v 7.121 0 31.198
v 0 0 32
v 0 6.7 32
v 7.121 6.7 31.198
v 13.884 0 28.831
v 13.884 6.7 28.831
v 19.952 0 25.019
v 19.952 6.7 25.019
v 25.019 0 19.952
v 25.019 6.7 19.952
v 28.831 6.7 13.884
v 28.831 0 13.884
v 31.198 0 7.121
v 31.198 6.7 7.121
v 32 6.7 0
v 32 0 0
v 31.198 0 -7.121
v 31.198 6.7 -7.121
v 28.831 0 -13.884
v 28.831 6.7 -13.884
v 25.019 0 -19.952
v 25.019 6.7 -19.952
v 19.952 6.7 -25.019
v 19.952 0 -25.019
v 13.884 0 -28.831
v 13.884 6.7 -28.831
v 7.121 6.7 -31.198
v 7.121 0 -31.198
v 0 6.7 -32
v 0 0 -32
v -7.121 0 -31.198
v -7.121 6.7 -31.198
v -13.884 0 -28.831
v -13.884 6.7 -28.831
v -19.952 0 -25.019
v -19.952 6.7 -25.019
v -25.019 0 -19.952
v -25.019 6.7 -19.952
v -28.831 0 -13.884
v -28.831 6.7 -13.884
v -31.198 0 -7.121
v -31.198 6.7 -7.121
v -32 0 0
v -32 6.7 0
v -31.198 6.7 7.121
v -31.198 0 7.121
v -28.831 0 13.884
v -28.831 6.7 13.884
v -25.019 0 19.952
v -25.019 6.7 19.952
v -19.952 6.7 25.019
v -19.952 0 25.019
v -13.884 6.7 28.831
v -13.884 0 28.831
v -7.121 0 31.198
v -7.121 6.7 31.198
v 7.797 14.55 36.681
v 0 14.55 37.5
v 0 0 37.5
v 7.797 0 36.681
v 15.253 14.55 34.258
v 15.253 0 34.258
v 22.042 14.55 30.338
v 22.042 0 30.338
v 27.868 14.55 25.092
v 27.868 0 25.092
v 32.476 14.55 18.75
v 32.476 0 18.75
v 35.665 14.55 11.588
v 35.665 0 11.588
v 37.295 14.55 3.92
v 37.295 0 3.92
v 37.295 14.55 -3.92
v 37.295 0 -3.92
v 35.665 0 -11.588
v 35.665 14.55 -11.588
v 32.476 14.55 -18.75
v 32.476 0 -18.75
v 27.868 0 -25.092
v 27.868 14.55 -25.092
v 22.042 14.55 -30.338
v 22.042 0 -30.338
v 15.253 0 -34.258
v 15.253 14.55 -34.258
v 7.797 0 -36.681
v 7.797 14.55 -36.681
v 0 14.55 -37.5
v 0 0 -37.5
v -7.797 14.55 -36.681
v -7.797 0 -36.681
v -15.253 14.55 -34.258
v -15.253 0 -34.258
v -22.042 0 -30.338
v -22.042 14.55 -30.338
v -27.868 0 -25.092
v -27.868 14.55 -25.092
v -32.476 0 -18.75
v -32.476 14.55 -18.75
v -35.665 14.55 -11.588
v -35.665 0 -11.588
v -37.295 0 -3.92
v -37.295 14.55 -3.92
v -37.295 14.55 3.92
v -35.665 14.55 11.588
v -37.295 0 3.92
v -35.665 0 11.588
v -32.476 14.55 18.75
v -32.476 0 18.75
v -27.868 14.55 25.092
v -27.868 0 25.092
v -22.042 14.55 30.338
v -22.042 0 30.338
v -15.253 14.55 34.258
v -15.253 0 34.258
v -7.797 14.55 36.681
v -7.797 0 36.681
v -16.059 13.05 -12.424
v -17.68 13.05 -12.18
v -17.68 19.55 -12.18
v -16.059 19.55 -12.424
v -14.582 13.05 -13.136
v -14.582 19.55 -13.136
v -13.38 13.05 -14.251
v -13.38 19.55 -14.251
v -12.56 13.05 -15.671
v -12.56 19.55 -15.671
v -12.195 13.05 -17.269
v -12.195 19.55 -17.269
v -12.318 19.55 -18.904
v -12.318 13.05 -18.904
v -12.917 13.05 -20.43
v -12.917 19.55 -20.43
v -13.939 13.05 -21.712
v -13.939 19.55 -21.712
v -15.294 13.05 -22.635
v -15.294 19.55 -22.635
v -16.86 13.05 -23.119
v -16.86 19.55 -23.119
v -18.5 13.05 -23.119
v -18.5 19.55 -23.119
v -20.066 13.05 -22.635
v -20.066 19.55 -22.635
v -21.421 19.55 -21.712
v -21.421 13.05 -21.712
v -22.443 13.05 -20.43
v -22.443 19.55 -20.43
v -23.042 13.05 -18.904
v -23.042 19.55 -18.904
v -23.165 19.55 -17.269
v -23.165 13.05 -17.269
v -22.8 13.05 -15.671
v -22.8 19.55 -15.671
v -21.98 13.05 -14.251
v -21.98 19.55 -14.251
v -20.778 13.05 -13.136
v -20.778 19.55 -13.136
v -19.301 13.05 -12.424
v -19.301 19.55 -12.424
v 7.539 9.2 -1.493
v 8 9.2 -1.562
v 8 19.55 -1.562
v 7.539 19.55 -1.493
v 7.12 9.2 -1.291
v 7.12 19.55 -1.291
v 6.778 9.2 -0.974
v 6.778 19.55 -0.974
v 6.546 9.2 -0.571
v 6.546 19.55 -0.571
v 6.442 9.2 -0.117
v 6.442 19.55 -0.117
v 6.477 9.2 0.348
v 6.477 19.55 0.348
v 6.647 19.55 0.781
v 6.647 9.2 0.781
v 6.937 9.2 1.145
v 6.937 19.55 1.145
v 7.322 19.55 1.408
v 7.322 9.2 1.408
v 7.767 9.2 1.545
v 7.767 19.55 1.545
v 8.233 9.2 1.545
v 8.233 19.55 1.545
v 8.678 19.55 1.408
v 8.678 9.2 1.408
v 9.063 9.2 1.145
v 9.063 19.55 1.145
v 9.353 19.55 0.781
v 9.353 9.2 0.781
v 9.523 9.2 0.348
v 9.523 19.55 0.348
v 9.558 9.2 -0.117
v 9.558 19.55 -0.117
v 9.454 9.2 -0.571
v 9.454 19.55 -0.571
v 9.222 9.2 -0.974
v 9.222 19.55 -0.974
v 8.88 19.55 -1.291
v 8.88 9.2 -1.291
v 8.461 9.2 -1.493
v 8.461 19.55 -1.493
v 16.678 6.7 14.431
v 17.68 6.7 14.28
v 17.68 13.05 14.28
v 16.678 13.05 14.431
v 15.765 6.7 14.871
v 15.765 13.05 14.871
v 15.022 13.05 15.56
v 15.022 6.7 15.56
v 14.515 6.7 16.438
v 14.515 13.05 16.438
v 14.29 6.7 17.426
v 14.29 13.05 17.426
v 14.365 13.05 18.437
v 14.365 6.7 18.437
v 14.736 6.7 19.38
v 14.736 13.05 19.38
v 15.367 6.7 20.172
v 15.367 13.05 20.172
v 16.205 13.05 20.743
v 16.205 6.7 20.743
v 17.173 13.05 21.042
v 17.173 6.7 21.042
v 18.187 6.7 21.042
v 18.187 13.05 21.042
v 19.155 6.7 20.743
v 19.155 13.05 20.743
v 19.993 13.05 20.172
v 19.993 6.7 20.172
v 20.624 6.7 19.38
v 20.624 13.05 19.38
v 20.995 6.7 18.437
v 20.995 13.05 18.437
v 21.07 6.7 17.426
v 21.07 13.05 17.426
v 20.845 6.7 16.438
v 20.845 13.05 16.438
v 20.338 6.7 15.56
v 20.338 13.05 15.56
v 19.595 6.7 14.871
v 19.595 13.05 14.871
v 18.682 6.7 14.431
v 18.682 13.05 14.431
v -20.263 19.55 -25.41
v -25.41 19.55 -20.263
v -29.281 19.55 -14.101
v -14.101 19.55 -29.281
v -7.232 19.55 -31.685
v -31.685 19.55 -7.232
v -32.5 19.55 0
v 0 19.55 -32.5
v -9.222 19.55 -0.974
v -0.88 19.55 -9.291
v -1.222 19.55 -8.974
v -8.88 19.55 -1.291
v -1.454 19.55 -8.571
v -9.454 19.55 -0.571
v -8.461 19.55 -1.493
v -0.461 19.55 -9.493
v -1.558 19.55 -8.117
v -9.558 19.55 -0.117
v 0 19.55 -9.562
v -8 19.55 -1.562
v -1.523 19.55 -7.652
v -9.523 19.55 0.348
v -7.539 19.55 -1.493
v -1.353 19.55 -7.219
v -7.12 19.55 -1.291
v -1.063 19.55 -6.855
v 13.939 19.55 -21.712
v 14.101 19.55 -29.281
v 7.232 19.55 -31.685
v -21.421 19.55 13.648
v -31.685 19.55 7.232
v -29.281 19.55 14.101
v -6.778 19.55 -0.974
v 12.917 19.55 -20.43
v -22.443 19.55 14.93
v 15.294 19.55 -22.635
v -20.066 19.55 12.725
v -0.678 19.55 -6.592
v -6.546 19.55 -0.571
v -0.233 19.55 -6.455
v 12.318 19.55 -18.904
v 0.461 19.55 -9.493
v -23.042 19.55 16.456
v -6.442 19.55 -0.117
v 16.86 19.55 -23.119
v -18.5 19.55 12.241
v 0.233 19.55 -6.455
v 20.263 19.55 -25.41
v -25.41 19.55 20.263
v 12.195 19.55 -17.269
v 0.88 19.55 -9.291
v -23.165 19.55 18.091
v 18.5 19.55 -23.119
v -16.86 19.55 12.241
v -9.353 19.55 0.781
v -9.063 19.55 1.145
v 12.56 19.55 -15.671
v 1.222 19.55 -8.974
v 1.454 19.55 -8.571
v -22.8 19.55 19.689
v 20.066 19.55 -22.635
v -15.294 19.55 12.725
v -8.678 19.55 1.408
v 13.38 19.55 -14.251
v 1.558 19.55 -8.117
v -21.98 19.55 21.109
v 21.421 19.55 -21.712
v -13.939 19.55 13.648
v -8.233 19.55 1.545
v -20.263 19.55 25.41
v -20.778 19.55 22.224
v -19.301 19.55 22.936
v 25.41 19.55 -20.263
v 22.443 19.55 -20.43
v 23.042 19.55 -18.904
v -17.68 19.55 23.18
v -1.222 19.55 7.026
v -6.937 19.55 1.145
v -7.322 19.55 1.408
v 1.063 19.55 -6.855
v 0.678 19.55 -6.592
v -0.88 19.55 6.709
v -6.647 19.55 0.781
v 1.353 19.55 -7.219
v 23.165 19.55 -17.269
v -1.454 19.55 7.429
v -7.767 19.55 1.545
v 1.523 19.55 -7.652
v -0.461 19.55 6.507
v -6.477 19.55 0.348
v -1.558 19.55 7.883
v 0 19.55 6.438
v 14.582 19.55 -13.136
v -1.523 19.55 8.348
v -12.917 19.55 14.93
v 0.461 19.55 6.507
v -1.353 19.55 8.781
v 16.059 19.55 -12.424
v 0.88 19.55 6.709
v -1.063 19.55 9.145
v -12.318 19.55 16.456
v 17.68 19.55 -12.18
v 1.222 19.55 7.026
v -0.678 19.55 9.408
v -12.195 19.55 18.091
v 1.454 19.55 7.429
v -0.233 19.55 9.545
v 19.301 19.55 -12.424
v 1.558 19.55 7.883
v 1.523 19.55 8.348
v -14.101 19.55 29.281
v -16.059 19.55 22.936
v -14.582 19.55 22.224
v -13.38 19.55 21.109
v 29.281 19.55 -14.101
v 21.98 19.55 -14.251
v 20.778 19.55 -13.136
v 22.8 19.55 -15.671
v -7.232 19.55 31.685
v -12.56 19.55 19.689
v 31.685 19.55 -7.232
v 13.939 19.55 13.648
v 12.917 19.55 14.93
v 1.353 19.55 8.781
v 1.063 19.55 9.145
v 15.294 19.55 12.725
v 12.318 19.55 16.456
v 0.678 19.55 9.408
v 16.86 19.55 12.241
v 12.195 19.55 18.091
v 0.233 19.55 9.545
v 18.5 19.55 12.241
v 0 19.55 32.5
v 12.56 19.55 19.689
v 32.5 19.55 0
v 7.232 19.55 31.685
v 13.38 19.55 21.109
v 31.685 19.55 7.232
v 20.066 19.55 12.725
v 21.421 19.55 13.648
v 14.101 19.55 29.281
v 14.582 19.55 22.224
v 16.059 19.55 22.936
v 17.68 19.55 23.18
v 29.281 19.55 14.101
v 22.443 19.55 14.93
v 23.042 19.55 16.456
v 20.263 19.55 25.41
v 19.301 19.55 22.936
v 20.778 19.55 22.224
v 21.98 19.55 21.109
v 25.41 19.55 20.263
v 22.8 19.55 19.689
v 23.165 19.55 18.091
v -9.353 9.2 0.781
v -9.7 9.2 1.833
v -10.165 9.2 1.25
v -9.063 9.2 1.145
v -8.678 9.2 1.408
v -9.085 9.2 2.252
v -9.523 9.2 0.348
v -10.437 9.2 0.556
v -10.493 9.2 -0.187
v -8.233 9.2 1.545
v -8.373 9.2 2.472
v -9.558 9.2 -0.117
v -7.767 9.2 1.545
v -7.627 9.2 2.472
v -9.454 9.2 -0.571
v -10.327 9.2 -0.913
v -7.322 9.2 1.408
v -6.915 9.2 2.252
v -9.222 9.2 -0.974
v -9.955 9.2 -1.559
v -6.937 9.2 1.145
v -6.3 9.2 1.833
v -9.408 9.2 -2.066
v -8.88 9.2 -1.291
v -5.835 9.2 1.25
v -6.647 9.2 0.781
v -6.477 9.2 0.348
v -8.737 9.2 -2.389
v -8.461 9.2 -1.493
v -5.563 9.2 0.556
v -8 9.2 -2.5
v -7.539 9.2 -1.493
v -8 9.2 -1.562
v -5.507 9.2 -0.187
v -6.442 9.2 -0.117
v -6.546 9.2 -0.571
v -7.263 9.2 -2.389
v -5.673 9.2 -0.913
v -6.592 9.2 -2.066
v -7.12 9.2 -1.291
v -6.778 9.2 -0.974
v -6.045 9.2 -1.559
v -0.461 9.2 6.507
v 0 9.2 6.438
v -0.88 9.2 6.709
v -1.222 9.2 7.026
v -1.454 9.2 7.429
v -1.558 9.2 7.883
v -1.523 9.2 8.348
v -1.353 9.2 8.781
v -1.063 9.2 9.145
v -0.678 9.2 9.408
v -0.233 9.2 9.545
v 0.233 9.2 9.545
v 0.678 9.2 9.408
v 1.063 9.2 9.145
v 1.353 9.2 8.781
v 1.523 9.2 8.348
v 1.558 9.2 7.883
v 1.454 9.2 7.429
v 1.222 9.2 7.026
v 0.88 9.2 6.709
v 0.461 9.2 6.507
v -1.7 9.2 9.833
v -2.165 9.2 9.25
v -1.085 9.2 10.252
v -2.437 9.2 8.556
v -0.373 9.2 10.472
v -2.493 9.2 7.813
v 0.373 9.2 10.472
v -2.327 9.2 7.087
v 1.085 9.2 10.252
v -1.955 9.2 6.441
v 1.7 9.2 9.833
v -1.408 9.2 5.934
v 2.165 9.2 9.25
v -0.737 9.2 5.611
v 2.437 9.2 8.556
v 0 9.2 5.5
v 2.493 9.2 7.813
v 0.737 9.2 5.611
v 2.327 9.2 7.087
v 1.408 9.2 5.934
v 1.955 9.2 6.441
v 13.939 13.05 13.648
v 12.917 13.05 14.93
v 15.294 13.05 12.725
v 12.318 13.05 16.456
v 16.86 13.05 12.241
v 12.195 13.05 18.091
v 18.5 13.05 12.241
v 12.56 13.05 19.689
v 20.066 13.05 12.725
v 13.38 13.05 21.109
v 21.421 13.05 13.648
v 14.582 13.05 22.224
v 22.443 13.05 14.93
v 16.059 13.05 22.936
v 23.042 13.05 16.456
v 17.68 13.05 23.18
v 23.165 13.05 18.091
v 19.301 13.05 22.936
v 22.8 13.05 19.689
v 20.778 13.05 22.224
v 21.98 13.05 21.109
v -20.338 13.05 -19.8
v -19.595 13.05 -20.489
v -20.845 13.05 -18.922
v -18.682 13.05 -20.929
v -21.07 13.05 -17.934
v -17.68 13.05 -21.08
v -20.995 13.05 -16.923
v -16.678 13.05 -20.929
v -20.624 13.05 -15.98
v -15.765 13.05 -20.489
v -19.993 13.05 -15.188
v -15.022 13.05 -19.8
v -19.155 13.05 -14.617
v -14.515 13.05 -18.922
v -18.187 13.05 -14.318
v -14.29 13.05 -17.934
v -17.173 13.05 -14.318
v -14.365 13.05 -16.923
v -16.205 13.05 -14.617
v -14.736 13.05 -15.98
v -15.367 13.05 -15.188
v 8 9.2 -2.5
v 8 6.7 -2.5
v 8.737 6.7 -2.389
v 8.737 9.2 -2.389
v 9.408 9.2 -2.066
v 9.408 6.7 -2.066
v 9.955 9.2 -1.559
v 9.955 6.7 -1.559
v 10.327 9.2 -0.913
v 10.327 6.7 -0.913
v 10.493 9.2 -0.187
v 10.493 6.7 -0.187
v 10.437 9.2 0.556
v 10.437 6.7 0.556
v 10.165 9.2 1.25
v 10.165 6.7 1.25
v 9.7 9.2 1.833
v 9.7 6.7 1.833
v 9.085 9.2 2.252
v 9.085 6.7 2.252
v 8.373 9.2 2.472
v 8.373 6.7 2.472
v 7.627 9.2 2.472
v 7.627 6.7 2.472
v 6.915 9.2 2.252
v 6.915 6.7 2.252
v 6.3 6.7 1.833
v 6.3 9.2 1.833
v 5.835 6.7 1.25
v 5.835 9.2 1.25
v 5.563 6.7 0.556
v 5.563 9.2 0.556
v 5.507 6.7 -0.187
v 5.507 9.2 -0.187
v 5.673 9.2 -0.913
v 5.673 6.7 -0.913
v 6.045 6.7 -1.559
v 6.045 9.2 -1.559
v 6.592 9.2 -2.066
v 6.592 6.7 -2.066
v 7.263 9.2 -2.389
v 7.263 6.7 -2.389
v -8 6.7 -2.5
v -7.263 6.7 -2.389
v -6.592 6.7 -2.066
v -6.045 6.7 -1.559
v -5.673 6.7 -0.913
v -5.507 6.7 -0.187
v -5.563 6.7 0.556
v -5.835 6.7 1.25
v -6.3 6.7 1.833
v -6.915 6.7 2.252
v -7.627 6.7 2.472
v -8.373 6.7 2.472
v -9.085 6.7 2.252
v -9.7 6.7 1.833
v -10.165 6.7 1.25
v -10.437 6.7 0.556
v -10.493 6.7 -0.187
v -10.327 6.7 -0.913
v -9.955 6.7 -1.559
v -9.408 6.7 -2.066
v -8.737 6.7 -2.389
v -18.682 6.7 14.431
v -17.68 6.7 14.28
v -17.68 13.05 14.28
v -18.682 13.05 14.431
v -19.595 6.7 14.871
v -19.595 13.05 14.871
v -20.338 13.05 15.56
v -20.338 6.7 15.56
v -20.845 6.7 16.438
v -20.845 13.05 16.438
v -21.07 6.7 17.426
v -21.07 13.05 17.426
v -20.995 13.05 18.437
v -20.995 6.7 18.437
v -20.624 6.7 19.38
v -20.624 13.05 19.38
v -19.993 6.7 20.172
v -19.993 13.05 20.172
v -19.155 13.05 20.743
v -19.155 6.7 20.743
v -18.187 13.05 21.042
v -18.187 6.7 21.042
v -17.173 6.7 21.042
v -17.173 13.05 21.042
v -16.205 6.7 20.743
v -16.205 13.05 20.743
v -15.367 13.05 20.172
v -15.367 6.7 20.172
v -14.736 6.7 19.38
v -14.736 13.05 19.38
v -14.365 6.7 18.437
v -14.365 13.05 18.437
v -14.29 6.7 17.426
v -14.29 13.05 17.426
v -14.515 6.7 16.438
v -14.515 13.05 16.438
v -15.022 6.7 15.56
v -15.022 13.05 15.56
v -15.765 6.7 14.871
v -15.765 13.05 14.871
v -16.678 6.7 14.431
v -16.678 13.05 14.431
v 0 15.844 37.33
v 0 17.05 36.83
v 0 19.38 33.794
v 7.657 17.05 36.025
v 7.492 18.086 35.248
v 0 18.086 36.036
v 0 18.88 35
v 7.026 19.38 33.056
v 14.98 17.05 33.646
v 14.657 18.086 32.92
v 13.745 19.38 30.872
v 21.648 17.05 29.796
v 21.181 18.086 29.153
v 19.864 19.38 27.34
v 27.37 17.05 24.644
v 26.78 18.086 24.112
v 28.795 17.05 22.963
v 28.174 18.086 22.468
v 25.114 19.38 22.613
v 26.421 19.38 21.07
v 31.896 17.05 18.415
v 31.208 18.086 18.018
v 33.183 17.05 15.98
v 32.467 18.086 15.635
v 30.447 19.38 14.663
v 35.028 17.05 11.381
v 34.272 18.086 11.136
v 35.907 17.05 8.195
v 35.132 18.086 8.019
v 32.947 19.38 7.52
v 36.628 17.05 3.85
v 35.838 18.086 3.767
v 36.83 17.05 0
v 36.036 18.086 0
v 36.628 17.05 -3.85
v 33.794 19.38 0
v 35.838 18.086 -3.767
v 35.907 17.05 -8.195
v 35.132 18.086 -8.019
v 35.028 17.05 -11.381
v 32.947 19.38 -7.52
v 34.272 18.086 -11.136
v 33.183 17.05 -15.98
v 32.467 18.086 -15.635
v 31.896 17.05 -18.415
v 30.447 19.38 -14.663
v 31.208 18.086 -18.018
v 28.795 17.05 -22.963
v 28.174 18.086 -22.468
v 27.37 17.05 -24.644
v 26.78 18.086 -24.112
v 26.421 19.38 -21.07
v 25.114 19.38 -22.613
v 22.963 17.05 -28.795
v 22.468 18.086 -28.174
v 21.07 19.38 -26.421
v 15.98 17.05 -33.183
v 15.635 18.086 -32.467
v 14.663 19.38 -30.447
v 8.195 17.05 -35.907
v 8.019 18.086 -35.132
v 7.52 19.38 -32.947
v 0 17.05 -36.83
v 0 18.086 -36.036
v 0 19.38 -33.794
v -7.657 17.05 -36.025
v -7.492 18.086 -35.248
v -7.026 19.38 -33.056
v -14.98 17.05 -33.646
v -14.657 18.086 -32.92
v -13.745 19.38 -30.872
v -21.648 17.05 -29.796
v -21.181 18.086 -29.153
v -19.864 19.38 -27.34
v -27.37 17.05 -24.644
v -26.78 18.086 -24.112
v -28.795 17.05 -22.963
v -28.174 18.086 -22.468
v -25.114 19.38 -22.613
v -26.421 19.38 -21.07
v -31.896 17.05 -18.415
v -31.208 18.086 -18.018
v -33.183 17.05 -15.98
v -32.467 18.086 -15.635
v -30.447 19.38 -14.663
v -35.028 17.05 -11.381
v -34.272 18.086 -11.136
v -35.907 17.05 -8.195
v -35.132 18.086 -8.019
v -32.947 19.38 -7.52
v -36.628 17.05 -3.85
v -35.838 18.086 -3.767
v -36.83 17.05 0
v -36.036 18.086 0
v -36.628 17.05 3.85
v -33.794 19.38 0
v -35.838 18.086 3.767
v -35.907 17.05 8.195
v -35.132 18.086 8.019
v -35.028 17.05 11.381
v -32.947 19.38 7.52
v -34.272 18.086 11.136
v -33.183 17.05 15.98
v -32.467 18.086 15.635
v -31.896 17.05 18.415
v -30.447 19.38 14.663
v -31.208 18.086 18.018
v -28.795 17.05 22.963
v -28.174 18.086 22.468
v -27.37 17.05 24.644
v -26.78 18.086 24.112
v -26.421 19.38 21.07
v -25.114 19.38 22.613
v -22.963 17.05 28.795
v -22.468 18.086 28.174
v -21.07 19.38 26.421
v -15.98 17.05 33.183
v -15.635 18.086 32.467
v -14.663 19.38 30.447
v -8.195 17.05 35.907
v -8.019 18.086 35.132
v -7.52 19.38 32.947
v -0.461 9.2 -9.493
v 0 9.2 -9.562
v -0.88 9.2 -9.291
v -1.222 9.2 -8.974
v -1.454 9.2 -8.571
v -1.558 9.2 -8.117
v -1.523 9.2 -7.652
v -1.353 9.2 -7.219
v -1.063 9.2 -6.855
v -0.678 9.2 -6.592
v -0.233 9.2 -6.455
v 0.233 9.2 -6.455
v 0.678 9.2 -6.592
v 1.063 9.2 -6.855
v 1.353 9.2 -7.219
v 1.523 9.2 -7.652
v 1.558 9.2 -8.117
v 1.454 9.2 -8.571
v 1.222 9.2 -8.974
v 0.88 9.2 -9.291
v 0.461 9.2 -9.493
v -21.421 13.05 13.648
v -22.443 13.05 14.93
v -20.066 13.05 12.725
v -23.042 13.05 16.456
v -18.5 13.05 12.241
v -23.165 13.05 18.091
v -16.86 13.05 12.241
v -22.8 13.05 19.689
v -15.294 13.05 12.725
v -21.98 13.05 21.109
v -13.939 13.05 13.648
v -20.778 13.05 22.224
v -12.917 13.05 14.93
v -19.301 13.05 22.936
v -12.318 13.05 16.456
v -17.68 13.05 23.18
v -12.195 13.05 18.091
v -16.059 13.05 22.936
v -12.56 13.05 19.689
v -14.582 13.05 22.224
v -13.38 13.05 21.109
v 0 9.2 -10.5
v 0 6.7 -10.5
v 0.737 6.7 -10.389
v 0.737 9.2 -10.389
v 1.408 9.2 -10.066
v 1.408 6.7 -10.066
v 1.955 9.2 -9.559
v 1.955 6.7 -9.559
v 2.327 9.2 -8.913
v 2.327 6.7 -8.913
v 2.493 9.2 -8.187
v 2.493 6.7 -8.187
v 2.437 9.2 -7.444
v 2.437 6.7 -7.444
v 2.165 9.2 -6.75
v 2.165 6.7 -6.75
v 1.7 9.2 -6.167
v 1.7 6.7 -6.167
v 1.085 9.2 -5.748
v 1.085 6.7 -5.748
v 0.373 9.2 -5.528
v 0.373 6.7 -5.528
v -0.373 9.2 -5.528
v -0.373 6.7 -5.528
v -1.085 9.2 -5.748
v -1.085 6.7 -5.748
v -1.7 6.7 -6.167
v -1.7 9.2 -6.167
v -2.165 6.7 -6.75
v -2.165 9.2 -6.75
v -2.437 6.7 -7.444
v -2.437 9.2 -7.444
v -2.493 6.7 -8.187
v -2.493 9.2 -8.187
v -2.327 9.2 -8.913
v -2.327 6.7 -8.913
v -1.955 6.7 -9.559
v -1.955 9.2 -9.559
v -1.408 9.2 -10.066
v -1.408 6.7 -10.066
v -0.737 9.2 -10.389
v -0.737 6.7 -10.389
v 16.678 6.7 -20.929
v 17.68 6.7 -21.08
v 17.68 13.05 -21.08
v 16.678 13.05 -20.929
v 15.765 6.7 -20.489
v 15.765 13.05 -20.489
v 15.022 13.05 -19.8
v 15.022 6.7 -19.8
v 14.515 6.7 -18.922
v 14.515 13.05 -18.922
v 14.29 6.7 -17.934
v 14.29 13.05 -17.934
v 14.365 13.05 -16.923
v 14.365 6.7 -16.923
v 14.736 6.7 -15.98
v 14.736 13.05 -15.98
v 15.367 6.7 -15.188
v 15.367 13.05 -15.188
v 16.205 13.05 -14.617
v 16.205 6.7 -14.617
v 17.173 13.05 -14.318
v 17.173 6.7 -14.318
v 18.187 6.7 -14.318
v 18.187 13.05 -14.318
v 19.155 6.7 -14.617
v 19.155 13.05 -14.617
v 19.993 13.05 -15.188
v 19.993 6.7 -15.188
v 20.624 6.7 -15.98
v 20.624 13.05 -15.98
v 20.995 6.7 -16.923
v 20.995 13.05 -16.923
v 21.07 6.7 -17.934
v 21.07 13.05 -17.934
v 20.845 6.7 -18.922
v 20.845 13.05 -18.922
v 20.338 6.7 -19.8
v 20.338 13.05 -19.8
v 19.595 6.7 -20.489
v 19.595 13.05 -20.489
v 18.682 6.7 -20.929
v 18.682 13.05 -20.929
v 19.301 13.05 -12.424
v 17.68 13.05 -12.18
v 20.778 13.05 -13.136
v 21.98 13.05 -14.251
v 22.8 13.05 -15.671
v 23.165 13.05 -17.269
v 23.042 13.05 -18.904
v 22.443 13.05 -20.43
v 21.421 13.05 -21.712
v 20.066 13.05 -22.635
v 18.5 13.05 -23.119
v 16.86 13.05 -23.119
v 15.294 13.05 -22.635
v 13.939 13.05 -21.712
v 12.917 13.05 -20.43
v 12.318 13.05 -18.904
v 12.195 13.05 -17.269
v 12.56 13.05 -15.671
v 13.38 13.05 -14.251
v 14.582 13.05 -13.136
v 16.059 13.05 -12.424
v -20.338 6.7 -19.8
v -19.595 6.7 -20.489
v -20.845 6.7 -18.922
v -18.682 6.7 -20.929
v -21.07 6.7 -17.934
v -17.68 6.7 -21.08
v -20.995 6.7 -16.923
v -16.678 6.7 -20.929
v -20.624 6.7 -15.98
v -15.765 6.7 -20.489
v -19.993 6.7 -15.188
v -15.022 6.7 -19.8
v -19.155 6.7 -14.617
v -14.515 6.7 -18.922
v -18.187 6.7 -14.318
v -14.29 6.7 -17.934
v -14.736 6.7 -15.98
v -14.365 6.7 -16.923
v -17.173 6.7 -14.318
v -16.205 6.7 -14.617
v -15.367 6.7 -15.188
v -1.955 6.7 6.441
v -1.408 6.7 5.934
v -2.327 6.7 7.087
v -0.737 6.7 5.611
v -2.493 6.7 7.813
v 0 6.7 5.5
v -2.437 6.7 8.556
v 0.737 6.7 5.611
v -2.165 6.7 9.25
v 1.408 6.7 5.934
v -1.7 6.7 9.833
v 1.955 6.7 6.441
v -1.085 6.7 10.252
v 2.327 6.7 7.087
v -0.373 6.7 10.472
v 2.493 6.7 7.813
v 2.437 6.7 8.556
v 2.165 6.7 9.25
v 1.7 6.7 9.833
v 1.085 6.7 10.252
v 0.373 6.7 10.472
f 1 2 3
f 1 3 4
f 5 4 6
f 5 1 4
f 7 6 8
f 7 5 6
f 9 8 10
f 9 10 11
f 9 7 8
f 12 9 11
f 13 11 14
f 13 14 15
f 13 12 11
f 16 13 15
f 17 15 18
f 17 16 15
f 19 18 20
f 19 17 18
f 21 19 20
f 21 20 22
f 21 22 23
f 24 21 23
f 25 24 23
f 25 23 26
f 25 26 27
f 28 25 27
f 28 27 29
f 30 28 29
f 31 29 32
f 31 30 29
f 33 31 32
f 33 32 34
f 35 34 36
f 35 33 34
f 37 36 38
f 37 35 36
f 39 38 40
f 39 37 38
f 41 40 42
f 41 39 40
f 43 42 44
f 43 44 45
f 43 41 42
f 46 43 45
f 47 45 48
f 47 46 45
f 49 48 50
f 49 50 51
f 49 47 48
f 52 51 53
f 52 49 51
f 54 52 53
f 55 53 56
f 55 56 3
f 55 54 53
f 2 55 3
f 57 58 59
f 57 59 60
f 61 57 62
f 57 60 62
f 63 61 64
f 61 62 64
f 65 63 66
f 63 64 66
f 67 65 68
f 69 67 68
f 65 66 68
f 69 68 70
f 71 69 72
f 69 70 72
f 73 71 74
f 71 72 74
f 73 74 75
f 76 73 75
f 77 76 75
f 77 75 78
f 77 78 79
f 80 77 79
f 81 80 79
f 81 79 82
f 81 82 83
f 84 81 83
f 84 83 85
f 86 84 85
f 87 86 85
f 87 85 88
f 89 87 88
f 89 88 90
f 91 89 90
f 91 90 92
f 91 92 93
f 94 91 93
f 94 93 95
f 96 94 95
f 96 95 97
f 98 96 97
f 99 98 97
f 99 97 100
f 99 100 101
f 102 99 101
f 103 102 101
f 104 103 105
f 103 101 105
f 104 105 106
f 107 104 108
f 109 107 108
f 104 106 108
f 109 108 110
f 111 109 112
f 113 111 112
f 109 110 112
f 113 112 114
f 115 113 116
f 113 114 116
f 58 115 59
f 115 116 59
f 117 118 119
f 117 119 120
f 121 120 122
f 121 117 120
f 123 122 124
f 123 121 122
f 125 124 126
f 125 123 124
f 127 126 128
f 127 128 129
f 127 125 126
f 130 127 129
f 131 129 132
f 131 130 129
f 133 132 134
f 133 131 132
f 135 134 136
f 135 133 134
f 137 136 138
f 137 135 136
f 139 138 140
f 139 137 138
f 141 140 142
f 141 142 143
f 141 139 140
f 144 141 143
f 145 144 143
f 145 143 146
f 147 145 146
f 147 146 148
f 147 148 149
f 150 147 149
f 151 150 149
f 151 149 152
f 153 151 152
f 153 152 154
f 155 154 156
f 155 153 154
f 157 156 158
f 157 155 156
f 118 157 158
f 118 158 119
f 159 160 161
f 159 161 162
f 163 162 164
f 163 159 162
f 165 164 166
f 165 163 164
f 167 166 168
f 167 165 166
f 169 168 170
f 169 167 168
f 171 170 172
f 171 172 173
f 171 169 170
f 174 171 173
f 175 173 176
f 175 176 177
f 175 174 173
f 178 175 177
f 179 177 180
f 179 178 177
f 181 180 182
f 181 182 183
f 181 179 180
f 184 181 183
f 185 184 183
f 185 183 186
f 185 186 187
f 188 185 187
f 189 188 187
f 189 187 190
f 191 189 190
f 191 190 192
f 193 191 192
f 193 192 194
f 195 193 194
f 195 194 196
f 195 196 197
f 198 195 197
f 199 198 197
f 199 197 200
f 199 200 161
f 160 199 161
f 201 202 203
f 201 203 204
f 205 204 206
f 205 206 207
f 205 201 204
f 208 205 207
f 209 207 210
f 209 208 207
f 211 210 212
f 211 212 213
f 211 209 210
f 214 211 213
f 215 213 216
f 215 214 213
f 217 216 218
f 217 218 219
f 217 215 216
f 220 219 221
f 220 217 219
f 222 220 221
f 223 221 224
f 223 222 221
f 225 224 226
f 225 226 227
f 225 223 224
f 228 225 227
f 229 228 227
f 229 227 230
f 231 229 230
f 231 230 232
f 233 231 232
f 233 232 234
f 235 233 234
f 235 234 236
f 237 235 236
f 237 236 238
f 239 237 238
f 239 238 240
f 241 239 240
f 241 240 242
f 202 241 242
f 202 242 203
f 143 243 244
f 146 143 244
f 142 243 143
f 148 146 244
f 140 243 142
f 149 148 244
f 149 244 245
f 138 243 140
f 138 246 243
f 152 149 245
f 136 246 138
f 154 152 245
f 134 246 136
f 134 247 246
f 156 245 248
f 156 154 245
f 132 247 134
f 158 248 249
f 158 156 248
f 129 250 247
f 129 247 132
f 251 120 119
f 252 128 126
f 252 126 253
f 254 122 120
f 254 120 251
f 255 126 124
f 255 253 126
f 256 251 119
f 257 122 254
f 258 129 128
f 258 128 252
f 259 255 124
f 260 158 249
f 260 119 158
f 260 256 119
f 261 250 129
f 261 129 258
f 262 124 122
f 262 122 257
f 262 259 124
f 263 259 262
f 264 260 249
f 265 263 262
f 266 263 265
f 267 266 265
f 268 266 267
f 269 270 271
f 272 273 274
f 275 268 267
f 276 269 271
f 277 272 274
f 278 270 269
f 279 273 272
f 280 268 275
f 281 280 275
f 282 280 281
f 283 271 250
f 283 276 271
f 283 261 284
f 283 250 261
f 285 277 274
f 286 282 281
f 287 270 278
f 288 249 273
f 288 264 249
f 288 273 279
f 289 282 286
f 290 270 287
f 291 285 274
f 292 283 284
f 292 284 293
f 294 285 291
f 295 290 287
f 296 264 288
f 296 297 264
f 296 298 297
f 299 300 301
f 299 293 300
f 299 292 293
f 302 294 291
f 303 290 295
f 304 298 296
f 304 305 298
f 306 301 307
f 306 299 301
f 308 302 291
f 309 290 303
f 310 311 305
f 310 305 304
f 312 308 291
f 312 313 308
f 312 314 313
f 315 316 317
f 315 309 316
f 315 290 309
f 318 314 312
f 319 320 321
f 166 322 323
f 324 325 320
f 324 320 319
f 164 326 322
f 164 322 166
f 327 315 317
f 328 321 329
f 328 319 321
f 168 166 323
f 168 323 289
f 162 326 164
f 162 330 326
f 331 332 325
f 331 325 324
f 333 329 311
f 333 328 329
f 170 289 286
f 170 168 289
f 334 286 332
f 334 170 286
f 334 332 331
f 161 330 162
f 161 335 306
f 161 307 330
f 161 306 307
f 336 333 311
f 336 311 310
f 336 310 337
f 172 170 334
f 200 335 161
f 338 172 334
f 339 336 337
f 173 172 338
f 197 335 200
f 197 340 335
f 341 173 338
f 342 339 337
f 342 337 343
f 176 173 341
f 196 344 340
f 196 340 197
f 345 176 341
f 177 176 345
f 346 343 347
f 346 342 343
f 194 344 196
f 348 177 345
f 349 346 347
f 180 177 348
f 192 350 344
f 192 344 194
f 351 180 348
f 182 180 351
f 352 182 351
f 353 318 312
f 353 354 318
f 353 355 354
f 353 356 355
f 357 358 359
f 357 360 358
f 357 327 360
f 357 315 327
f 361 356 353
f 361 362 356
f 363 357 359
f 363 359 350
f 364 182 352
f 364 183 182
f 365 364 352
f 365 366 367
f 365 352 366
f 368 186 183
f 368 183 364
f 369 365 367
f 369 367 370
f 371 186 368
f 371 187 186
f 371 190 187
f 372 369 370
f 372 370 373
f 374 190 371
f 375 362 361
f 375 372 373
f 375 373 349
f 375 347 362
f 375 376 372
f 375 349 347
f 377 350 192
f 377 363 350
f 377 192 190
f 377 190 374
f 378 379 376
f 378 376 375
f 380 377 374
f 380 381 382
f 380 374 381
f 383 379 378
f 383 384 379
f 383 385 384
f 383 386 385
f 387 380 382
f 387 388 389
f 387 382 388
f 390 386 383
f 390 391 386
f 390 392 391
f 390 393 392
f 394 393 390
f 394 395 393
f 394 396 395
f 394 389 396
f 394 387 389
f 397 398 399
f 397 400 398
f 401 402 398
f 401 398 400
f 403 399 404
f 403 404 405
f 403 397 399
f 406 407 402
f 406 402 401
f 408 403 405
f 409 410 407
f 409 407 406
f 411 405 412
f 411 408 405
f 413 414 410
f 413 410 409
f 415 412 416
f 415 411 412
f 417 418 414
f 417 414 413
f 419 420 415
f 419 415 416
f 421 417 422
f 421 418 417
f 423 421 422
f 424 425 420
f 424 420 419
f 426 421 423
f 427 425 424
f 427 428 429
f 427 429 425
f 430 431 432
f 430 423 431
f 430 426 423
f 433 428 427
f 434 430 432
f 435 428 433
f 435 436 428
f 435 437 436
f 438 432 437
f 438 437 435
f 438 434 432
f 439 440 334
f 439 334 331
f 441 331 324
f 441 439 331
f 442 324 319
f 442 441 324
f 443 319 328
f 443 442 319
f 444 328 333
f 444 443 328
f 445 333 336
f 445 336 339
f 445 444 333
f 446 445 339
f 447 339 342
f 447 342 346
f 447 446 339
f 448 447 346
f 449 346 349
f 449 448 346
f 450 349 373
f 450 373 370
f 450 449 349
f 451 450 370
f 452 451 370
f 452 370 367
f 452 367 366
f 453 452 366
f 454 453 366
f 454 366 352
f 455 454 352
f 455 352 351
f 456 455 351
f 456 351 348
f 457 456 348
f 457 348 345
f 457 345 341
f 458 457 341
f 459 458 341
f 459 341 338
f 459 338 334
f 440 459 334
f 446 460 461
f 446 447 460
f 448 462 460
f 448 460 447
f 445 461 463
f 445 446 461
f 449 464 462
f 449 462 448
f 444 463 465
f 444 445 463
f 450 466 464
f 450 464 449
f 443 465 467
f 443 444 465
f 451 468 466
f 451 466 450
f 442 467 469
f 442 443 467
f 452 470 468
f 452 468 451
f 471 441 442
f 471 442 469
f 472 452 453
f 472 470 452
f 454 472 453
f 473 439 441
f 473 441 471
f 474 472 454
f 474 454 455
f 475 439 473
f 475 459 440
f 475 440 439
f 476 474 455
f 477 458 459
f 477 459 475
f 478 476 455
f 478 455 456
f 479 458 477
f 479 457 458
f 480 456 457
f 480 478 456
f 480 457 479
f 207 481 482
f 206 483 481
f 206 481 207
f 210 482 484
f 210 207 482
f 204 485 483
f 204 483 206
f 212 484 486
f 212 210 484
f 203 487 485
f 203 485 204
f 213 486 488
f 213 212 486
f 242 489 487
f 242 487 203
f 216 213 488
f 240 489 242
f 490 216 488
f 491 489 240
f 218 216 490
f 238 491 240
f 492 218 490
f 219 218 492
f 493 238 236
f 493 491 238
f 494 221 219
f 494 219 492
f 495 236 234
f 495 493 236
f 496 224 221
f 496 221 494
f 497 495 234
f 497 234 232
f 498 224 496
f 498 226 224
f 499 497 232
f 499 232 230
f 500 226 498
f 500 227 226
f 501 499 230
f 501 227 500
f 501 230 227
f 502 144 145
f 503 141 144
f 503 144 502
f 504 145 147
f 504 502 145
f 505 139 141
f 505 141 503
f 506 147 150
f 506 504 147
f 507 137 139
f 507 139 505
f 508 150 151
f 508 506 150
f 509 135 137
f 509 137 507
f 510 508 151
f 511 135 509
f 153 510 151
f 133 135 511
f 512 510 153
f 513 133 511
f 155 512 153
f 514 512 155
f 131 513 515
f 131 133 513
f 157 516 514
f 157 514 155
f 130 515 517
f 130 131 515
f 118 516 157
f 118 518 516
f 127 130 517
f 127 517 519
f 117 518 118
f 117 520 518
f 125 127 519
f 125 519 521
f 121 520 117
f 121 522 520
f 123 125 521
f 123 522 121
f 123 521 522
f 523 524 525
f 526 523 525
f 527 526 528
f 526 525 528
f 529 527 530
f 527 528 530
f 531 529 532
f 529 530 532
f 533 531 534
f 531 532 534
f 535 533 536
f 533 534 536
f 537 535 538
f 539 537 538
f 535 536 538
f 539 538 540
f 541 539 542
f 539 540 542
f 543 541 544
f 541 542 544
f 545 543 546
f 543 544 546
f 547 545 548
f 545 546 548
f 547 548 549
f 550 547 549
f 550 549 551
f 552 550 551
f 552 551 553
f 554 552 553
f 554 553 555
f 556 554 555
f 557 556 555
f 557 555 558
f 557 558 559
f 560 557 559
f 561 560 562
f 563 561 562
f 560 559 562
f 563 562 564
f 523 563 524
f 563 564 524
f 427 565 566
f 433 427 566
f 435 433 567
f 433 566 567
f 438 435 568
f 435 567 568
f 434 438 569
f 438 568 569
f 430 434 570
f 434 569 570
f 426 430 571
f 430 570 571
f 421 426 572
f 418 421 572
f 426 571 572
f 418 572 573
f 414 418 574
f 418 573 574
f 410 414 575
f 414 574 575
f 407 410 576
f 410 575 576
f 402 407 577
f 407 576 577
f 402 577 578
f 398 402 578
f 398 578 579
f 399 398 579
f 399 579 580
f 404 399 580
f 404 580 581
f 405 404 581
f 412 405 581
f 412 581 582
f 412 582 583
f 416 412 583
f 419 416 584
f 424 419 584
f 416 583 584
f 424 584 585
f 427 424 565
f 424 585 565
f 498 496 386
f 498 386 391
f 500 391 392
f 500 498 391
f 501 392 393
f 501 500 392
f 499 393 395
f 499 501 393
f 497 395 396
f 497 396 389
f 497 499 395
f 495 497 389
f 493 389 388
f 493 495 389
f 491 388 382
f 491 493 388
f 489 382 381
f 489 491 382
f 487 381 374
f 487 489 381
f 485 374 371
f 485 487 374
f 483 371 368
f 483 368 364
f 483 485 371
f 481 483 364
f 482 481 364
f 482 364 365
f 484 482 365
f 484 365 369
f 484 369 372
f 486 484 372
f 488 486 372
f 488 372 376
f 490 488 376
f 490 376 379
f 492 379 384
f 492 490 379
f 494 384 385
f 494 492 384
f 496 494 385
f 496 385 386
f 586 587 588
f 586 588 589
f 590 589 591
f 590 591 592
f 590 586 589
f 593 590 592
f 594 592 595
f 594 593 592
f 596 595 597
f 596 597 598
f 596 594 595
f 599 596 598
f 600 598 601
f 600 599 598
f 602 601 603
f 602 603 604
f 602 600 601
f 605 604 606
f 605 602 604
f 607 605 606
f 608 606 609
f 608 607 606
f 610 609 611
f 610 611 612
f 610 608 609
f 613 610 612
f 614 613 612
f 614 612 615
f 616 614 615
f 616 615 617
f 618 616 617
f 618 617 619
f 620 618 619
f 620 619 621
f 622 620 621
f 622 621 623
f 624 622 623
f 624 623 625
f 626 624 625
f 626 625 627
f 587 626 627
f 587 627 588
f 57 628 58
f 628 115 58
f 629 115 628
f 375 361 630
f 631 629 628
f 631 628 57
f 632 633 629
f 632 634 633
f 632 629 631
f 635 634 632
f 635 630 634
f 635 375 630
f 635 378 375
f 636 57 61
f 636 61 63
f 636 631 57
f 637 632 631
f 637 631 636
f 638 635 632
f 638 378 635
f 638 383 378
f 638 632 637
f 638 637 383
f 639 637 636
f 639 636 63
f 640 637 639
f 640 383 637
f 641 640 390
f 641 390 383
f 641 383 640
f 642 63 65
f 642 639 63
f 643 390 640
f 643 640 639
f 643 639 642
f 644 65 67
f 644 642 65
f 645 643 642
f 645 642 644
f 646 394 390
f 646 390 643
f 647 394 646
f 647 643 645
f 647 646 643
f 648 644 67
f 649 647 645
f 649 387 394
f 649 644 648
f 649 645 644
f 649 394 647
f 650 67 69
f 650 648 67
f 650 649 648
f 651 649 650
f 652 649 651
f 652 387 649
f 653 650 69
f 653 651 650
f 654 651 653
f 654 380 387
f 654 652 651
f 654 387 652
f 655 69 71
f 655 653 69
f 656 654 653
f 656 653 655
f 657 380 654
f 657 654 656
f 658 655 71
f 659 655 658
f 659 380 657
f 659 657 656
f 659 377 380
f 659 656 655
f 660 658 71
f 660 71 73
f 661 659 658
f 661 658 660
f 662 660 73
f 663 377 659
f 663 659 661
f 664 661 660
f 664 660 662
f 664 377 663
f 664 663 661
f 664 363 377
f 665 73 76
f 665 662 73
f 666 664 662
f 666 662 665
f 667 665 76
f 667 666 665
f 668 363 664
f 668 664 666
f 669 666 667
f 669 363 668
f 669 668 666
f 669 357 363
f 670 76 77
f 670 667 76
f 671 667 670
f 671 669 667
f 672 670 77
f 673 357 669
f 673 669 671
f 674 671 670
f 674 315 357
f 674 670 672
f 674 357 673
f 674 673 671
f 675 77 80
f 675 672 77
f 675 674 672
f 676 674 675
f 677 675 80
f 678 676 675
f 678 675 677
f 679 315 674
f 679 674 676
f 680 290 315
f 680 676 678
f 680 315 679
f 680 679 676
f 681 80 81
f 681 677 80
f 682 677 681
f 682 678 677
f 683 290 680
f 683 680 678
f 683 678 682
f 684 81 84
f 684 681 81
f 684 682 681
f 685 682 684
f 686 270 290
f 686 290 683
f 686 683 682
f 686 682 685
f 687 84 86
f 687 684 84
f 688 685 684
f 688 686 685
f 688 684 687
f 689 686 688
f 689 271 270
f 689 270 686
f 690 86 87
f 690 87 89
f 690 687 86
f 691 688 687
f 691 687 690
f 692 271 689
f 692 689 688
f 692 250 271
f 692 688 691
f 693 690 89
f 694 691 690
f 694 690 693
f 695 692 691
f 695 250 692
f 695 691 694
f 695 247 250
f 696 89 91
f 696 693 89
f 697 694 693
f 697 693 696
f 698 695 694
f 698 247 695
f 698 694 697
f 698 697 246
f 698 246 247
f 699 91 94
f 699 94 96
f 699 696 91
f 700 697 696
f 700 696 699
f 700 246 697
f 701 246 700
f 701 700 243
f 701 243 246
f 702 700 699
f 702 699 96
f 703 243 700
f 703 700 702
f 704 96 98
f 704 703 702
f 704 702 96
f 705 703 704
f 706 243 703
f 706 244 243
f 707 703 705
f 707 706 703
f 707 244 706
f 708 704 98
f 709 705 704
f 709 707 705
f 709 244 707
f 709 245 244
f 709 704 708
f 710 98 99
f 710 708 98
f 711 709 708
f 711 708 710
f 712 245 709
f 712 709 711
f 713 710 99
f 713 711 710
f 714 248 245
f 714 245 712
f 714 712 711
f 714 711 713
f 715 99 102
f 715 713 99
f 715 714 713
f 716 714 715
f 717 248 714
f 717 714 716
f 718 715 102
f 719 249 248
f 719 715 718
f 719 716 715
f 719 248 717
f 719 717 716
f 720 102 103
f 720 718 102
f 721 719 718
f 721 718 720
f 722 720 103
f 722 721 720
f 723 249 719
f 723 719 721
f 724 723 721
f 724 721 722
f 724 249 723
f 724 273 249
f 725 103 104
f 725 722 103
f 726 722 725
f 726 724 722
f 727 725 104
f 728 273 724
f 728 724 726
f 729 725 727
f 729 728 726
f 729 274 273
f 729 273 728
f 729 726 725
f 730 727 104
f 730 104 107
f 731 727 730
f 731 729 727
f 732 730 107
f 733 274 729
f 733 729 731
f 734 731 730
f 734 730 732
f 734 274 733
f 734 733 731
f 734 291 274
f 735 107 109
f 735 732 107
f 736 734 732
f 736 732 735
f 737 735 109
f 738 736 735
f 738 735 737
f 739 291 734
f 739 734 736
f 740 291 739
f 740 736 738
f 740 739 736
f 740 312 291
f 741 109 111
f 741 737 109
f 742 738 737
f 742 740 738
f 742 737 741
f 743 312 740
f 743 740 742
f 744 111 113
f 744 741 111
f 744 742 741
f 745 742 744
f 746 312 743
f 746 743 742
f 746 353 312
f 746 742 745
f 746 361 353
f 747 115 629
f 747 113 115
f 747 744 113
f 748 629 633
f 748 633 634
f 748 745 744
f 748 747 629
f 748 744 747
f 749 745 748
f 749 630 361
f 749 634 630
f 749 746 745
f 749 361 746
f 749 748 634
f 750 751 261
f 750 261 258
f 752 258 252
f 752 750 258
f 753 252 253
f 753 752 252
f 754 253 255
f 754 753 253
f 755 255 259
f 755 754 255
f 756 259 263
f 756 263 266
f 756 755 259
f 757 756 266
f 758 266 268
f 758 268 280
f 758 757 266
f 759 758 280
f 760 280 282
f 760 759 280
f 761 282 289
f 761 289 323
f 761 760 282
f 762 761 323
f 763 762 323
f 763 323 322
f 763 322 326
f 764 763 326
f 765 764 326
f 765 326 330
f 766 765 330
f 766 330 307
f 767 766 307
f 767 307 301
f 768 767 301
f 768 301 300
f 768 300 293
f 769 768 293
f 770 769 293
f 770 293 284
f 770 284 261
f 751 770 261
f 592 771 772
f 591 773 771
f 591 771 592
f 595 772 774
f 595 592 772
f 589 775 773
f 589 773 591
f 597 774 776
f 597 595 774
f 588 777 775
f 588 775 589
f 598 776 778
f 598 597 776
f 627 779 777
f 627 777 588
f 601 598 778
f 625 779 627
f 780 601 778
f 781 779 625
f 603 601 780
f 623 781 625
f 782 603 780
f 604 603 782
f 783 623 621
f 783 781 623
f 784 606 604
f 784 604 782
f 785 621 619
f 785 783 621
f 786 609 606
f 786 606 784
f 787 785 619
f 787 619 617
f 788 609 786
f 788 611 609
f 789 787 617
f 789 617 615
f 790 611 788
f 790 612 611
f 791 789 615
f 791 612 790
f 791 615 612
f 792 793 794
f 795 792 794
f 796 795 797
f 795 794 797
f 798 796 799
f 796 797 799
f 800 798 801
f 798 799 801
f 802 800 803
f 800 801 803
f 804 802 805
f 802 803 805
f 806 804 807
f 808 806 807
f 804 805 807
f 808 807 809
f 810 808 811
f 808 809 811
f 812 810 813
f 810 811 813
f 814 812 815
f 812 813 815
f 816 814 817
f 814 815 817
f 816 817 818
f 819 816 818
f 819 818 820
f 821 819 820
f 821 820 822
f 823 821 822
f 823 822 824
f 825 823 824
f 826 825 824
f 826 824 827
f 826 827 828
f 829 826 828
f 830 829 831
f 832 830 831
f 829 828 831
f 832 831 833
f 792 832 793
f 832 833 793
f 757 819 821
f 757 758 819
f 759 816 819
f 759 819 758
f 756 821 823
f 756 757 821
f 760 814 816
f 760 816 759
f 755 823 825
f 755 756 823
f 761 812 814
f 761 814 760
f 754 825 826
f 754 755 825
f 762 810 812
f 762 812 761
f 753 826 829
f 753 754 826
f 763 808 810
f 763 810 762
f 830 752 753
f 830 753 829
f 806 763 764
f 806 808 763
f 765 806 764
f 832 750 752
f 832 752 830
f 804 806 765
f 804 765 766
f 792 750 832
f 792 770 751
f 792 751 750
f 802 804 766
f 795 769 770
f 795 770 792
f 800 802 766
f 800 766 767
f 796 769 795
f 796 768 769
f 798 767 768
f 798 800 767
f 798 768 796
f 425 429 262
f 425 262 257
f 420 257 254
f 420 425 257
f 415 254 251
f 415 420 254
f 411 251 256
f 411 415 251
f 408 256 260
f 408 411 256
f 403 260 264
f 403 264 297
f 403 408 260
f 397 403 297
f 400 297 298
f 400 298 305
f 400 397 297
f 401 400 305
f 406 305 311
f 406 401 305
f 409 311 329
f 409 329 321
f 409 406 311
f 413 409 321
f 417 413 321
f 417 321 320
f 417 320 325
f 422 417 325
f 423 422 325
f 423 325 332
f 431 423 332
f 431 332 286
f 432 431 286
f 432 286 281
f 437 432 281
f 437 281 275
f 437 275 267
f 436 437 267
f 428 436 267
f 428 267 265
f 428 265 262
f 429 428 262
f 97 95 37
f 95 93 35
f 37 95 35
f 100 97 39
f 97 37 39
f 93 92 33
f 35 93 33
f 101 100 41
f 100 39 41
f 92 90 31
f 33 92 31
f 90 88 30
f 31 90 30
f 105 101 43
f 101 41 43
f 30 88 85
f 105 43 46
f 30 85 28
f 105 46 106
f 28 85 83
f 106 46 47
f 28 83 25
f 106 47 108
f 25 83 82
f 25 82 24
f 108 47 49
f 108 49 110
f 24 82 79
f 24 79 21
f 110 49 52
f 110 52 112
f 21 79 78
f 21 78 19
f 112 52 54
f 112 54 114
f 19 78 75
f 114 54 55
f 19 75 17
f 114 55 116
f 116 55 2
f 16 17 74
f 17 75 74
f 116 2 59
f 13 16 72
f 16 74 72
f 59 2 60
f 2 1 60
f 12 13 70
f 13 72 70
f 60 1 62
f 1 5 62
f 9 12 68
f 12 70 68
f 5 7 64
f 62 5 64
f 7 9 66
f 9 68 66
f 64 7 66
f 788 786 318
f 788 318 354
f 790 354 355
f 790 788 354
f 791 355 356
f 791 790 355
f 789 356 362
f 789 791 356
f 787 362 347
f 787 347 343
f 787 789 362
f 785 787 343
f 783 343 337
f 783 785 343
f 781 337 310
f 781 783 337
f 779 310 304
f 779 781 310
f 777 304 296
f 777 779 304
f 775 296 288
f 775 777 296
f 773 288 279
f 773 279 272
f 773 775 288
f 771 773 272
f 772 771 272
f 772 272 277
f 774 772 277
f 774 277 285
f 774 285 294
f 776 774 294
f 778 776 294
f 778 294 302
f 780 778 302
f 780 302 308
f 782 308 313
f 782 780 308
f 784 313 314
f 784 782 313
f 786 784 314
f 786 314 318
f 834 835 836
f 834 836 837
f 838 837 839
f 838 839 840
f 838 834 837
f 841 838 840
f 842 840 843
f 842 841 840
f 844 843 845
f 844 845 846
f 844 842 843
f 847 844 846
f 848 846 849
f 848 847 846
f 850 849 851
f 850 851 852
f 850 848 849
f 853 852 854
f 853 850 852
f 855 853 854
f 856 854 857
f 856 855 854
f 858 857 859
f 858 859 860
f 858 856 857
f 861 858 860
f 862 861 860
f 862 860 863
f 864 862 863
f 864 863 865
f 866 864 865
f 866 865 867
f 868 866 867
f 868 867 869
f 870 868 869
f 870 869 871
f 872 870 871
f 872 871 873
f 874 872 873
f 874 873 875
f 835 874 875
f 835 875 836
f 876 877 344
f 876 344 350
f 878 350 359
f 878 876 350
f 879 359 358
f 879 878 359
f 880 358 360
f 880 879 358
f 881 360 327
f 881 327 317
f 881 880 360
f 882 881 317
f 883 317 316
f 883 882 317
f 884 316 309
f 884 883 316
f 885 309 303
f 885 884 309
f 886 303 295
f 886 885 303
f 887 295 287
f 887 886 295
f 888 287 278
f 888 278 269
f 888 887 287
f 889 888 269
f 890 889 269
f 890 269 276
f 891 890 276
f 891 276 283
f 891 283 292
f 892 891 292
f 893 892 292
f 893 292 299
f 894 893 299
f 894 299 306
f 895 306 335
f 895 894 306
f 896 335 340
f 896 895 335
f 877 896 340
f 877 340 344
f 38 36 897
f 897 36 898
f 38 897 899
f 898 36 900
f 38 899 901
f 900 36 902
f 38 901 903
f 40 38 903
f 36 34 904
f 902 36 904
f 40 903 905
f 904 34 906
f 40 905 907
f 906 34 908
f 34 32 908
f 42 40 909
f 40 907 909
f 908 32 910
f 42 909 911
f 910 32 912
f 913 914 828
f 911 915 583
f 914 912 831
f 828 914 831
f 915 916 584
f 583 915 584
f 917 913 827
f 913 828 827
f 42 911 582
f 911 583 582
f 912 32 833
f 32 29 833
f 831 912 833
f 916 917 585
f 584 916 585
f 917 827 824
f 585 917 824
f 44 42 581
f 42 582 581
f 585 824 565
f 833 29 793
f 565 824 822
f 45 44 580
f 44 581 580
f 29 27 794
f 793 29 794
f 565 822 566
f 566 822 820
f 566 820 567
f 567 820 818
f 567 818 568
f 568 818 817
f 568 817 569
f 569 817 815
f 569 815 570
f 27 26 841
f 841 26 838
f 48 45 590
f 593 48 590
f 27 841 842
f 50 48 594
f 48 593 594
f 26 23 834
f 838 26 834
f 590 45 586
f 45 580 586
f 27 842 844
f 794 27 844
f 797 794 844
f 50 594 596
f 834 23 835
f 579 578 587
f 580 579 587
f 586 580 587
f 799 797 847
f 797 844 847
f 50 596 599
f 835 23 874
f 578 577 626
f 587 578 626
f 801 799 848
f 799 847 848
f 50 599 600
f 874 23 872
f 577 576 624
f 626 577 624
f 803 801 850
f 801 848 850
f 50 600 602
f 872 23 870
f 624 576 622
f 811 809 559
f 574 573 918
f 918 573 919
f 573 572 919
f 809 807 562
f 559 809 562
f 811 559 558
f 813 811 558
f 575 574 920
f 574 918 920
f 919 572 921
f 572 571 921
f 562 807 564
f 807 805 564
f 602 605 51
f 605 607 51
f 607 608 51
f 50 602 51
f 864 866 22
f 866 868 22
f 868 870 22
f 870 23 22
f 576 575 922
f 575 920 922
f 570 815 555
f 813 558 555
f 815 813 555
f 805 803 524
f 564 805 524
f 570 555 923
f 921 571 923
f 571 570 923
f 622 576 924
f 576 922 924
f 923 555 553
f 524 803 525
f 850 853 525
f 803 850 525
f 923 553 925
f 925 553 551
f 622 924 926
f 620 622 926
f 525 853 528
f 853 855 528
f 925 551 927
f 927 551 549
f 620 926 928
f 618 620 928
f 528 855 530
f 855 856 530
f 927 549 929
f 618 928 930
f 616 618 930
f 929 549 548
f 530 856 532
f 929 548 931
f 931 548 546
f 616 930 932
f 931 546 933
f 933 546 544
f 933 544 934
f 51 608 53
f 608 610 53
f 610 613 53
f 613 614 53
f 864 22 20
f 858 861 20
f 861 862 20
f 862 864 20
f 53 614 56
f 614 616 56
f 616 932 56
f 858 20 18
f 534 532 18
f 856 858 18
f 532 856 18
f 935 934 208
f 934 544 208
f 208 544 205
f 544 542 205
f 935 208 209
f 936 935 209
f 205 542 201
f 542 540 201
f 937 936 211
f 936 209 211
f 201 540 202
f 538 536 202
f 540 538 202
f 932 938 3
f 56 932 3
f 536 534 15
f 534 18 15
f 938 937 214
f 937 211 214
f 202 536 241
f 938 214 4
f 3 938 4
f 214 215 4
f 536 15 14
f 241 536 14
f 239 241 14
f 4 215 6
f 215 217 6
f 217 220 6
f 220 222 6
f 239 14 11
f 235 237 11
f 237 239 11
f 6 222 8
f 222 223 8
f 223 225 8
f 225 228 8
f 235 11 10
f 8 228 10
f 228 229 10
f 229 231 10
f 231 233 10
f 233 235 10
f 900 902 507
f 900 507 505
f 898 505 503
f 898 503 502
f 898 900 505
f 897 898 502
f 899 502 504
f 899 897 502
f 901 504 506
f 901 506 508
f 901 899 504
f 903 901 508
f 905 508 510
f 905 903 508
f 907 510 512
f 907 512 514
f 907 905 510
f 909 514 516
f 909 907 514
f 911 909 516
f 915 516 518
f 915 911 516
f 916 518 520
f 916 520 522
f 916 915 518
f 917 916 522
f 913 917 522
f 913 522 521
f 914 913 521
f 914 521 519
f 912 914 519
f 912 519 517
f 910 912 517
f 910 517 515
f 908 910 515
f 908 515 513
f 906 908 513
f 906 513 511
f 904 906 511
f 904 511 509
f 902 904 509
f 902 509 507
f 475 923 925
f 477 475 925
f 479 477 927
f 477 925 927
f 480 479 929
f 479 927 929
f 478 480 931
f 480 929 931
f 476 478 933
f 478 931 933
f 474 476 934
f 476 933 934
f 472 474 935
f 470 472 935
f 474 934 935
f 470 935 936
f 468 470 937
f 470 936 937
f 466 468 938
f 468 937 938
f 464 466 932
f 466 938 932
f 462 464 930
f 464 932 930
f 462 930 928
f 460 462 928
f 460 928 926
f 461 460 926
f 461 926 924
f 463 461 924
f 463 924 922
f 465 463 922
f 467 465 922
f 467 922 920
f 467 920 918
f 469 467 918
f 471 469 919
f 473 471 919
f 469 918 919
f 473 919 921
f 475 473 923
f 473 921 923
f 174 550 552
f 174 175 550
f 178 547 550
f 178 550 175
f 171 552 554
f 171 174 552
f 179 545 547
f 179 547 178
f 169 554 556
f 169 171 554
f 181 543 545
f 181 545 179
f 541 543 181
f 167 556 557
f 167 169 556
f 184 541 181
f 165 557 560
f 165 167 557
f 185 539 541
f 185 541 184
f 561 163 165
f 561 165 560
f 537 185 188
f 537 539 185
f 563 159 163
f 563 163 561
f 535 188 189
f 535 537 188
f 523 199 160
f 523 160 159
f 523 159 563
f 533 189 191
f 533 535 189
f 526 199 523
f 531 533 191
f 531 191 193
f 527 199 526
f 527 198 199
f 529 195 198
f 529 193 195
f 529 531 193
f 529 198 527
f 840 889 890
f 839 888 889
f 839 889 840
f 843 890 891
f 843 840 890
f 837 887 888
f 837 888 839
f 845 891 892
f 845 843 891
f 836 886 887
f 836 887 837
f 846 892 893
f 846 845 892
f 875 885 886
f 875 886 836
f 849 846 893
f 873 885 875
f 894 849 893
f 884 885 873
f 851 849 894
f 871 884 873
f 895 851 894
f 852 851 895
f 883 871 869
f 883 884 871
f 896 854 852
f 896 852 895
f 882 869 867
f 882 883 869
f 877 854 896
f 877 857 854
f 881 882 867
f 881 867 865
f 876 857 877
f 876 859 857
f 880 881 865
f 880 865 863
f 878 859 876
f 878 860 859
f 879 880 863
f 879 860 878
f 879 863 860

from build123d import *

# Parameters (mm, degrees)
SKETCH1_R           = 37.5
SKETCH1_R_2         = 32
BOSS_EXTRUDE1_DEPTH = 6.7
SKETCH2_R           = 37.5
SKETCH2_R_2         = 3.4
SKETCH2_R_3         = 1.5625
BOSS_EXTRUDE2_DEPTH = 12.85
CUT_EXTRUDE1_START  = -6.5
SKETCH3_R           = 5.5
SKETCH3_R_2         = 3.4
CUT_EXTRUDE1_DEPTH  = 6.5
SKETCH4_R           = 2.5
SKETCH4_R_2         = 1.5625
CUT_EXTRUDE2_DEPTH  = 2.5
FILLET1_R           = 5


with BuildPart() as part:
    # Sketch1 → Boss-Extrude1 (new body)
    with BuildSketch(Plane(origin=(0, 0, 0), x_dir=(1, 0, 0), z_dir=(0, 1, 0))):
        with Locations(Location((0, 0, 0), (0, 0, 270))):
            Circle(SKETCH1_R)
        with Locations(Location((0, 0, 0), (0, 0, 270))):
            Circle(SKETCH1_R_2, mode=Mode.SUBTRACT)
    extrude(amount=BOSS_EXTRUDE1_DEPTH)

    # Sketch2 → Boss-Extrude2 (add)
    with BuildSketch(Plane(origin=(0, 6.7, 0), x_dir=(1, 0, 0), z_dir=(0, 1, 0))):
        with Locations(Location((0, 0, 0), (0, 0, 270))):
            Circle(SKETCH2_R)
        with Locations(Location((-17.68, 17.68, 0), (0, 0, 90))):
            Circle(SKETCH2_R_2, mode=Mode.SUBTRACT)
        with Locations(Location((17.68, 17.68, 0), (0, 0, 90))):
            Circle(SKETCH2_R_2, mode=Mode.SUBTRACT)
        with Locations(Location((17.68, -17.68, 0), (0, 0, 90))):
            Circle(SKETCH2_R_2, mode=Mode.SUBTRACT)
        with Locations(Location((-17.68, -17.68, 0), (0, 0, 90))):
            Circle(SKETCH2_R_2, mode=Mode.SUBTRACT)
        with Locations(Location((0, 8, 0), (0, 0, 90))):
            Circle(SKETCH2_R_3, mode=Mode.SUBTRACT)
        with Locations(Location((8, 0, 0), (0, 0, 90))):
            Circle(SKETCH2_R_3, mode=Mode.SUBTRACT)
        with Locations(Location((-8, 0, 0), (0, 0, 90))):
            Circle(SKETCH2_R_3, mode=Mode.SUBTRACT)
        with Locations(Location((0, -8, 0), (0, 0, 90))):
            Circle(SKETCH2_R_3, mode=Mode.SUBTRACT)
    extrude(amount=BOSS_EXTRUDE2_DEPTH)

    # Sketch3 → Cut-Extrude1 (cut)
    # profile 1 of 4: a face of its own
    with BuildSketch(Plane(origin=(0, 19.55, 0), x_dir=(1, 0, 0), z_dir=(0, 1, 0)).offset(CUT_EXTRUDE1_START)):
        with Locations(Location((-17.68, 17.68, 0), (0, 0, 270))):
            Circle(SKETCH3_R)
        with Locations(Location((-17.68, 17.68, 0), (0, 0, 90))):
            Circle(SKETCH3_R_2, mode=Mode.SUBTRACT)
    # profile 2 of 4: a face of its own
    with BuildSketch(Plane(origin=(0, 19.55, 0), x_dir=(1, 0, 0), z_dir=(0, 1, 0)).offset(CUT_EXTRUDE1_START)):
        with Locations(Location((17.68, 17.68, 0), (0, 0, 270))):
            Circle(SKETCH3_R)
        with Locations(Location((17.68, 17.68, 0), (0, 0, 90))):
            Circle(SKETCH3_R_2, mode=Mode.SUBTRACT)
    # profile 3 of 4: a face of its own
    with BuildSketch(Plane(origin=(0, 19.55, 0), x_dir=(1, 0, 0), z_dir=(0, 1, 0)).offset(CUT_EXTRUDE1_START)):
        with Locations(Location((17.68, -17.68, 0), (0, 0, 270))):
            Circle(SKETCH3_R)
        with Locations(Location((17.68, -17.68, 0), (0, 0, 90))):
            Circle(SKETCH3_R_2, mode=Mode.SUBTRACT)
    # profile 4 of 4: a face of its own
    with BuildSketch(Plane(origin=(0, 19.55, 0), x_dir=(1, 0, 0), z_dir=(0, 1, 0)).offset(CUT_EXTRUDE1_START)):
        with Locations(Location((-17.68, -17.68, 0), (0, 0, 270))):
            Circle(SKETCH3_R)
        with Locations(Location((-17.68, -17.68, 0), (0, 0, 90))):
            Circle(SKETCH3_R_2, mode=Mode.SUBTRACT)
    extrude(amount=CUT_EXTRUDE1_DEPTH, mode=Mode.SUBTRACT)

    # Sketch4 → Cut-Extrude2 (cut)
    # profile 1 of 4: a face of its own
    with BuildSketch(Plane.XZ.offset(-6.7)):
        with Locations(Location((0, 8, 0), (0, 0, 270))):
            Circle(SKETCH4_R)
        with Locations(Location((0, 8, 0), (0, 0, 270))):
            Circle(SKETCH4_R_2, mode=Mode.SUBTRACT)
    # profile 2 of 4: a face of its own
    with BuildSketch(Plane.XZ.offset(-6.7)):
        with Locations(Location((8, 0, 0), (0, 0, 270))):
            Circle(SKETCH4_R)
        with Locations(Location((8, 0, 0), (0, 0, 270))):
            Circle(SKETCH4_R_2, mode=Mode.SUBTRACT)
    # profile 3 of 4: a face of its own
    with BuildSketch(Plane.XZ.offset(-6.7)):
        with Locations(Location((0, -8, 0), (0, 0, 270))):
            Circle(SKETCH4_R)
        with Locations(Location((0, -8, 0), (0, 0, 270))):
            Circle(SKETCH4_R_2, mode=Mode.SUBTRACT)
    # profile 4 of 4: a face of its own
    with BuildSketch(Plane.XZ.offset(-6.7)):
        with Locations(Location((-8, 0, 0), (0, 0, 270))):
            Circle(SKETCH4_R)
        with Locations(Location((-8, 0, 0), (0, 0, 270))):
            Circle(SKETCH4_R_2, mode=Mode.SUBTRACT)
    extrude(amount=-CUT_EXTRUDE2_DEPTH, mode=Mode.SUBTRACT)

    # Fillet1
    fillet1_edges = [part.edges().sort_by_distance(p)[0] for p in [
        (0, 19.55, -37.5),
    ]]
    fillet(fillet1_edges, radius=FILLET1_R)


solid = part.part
